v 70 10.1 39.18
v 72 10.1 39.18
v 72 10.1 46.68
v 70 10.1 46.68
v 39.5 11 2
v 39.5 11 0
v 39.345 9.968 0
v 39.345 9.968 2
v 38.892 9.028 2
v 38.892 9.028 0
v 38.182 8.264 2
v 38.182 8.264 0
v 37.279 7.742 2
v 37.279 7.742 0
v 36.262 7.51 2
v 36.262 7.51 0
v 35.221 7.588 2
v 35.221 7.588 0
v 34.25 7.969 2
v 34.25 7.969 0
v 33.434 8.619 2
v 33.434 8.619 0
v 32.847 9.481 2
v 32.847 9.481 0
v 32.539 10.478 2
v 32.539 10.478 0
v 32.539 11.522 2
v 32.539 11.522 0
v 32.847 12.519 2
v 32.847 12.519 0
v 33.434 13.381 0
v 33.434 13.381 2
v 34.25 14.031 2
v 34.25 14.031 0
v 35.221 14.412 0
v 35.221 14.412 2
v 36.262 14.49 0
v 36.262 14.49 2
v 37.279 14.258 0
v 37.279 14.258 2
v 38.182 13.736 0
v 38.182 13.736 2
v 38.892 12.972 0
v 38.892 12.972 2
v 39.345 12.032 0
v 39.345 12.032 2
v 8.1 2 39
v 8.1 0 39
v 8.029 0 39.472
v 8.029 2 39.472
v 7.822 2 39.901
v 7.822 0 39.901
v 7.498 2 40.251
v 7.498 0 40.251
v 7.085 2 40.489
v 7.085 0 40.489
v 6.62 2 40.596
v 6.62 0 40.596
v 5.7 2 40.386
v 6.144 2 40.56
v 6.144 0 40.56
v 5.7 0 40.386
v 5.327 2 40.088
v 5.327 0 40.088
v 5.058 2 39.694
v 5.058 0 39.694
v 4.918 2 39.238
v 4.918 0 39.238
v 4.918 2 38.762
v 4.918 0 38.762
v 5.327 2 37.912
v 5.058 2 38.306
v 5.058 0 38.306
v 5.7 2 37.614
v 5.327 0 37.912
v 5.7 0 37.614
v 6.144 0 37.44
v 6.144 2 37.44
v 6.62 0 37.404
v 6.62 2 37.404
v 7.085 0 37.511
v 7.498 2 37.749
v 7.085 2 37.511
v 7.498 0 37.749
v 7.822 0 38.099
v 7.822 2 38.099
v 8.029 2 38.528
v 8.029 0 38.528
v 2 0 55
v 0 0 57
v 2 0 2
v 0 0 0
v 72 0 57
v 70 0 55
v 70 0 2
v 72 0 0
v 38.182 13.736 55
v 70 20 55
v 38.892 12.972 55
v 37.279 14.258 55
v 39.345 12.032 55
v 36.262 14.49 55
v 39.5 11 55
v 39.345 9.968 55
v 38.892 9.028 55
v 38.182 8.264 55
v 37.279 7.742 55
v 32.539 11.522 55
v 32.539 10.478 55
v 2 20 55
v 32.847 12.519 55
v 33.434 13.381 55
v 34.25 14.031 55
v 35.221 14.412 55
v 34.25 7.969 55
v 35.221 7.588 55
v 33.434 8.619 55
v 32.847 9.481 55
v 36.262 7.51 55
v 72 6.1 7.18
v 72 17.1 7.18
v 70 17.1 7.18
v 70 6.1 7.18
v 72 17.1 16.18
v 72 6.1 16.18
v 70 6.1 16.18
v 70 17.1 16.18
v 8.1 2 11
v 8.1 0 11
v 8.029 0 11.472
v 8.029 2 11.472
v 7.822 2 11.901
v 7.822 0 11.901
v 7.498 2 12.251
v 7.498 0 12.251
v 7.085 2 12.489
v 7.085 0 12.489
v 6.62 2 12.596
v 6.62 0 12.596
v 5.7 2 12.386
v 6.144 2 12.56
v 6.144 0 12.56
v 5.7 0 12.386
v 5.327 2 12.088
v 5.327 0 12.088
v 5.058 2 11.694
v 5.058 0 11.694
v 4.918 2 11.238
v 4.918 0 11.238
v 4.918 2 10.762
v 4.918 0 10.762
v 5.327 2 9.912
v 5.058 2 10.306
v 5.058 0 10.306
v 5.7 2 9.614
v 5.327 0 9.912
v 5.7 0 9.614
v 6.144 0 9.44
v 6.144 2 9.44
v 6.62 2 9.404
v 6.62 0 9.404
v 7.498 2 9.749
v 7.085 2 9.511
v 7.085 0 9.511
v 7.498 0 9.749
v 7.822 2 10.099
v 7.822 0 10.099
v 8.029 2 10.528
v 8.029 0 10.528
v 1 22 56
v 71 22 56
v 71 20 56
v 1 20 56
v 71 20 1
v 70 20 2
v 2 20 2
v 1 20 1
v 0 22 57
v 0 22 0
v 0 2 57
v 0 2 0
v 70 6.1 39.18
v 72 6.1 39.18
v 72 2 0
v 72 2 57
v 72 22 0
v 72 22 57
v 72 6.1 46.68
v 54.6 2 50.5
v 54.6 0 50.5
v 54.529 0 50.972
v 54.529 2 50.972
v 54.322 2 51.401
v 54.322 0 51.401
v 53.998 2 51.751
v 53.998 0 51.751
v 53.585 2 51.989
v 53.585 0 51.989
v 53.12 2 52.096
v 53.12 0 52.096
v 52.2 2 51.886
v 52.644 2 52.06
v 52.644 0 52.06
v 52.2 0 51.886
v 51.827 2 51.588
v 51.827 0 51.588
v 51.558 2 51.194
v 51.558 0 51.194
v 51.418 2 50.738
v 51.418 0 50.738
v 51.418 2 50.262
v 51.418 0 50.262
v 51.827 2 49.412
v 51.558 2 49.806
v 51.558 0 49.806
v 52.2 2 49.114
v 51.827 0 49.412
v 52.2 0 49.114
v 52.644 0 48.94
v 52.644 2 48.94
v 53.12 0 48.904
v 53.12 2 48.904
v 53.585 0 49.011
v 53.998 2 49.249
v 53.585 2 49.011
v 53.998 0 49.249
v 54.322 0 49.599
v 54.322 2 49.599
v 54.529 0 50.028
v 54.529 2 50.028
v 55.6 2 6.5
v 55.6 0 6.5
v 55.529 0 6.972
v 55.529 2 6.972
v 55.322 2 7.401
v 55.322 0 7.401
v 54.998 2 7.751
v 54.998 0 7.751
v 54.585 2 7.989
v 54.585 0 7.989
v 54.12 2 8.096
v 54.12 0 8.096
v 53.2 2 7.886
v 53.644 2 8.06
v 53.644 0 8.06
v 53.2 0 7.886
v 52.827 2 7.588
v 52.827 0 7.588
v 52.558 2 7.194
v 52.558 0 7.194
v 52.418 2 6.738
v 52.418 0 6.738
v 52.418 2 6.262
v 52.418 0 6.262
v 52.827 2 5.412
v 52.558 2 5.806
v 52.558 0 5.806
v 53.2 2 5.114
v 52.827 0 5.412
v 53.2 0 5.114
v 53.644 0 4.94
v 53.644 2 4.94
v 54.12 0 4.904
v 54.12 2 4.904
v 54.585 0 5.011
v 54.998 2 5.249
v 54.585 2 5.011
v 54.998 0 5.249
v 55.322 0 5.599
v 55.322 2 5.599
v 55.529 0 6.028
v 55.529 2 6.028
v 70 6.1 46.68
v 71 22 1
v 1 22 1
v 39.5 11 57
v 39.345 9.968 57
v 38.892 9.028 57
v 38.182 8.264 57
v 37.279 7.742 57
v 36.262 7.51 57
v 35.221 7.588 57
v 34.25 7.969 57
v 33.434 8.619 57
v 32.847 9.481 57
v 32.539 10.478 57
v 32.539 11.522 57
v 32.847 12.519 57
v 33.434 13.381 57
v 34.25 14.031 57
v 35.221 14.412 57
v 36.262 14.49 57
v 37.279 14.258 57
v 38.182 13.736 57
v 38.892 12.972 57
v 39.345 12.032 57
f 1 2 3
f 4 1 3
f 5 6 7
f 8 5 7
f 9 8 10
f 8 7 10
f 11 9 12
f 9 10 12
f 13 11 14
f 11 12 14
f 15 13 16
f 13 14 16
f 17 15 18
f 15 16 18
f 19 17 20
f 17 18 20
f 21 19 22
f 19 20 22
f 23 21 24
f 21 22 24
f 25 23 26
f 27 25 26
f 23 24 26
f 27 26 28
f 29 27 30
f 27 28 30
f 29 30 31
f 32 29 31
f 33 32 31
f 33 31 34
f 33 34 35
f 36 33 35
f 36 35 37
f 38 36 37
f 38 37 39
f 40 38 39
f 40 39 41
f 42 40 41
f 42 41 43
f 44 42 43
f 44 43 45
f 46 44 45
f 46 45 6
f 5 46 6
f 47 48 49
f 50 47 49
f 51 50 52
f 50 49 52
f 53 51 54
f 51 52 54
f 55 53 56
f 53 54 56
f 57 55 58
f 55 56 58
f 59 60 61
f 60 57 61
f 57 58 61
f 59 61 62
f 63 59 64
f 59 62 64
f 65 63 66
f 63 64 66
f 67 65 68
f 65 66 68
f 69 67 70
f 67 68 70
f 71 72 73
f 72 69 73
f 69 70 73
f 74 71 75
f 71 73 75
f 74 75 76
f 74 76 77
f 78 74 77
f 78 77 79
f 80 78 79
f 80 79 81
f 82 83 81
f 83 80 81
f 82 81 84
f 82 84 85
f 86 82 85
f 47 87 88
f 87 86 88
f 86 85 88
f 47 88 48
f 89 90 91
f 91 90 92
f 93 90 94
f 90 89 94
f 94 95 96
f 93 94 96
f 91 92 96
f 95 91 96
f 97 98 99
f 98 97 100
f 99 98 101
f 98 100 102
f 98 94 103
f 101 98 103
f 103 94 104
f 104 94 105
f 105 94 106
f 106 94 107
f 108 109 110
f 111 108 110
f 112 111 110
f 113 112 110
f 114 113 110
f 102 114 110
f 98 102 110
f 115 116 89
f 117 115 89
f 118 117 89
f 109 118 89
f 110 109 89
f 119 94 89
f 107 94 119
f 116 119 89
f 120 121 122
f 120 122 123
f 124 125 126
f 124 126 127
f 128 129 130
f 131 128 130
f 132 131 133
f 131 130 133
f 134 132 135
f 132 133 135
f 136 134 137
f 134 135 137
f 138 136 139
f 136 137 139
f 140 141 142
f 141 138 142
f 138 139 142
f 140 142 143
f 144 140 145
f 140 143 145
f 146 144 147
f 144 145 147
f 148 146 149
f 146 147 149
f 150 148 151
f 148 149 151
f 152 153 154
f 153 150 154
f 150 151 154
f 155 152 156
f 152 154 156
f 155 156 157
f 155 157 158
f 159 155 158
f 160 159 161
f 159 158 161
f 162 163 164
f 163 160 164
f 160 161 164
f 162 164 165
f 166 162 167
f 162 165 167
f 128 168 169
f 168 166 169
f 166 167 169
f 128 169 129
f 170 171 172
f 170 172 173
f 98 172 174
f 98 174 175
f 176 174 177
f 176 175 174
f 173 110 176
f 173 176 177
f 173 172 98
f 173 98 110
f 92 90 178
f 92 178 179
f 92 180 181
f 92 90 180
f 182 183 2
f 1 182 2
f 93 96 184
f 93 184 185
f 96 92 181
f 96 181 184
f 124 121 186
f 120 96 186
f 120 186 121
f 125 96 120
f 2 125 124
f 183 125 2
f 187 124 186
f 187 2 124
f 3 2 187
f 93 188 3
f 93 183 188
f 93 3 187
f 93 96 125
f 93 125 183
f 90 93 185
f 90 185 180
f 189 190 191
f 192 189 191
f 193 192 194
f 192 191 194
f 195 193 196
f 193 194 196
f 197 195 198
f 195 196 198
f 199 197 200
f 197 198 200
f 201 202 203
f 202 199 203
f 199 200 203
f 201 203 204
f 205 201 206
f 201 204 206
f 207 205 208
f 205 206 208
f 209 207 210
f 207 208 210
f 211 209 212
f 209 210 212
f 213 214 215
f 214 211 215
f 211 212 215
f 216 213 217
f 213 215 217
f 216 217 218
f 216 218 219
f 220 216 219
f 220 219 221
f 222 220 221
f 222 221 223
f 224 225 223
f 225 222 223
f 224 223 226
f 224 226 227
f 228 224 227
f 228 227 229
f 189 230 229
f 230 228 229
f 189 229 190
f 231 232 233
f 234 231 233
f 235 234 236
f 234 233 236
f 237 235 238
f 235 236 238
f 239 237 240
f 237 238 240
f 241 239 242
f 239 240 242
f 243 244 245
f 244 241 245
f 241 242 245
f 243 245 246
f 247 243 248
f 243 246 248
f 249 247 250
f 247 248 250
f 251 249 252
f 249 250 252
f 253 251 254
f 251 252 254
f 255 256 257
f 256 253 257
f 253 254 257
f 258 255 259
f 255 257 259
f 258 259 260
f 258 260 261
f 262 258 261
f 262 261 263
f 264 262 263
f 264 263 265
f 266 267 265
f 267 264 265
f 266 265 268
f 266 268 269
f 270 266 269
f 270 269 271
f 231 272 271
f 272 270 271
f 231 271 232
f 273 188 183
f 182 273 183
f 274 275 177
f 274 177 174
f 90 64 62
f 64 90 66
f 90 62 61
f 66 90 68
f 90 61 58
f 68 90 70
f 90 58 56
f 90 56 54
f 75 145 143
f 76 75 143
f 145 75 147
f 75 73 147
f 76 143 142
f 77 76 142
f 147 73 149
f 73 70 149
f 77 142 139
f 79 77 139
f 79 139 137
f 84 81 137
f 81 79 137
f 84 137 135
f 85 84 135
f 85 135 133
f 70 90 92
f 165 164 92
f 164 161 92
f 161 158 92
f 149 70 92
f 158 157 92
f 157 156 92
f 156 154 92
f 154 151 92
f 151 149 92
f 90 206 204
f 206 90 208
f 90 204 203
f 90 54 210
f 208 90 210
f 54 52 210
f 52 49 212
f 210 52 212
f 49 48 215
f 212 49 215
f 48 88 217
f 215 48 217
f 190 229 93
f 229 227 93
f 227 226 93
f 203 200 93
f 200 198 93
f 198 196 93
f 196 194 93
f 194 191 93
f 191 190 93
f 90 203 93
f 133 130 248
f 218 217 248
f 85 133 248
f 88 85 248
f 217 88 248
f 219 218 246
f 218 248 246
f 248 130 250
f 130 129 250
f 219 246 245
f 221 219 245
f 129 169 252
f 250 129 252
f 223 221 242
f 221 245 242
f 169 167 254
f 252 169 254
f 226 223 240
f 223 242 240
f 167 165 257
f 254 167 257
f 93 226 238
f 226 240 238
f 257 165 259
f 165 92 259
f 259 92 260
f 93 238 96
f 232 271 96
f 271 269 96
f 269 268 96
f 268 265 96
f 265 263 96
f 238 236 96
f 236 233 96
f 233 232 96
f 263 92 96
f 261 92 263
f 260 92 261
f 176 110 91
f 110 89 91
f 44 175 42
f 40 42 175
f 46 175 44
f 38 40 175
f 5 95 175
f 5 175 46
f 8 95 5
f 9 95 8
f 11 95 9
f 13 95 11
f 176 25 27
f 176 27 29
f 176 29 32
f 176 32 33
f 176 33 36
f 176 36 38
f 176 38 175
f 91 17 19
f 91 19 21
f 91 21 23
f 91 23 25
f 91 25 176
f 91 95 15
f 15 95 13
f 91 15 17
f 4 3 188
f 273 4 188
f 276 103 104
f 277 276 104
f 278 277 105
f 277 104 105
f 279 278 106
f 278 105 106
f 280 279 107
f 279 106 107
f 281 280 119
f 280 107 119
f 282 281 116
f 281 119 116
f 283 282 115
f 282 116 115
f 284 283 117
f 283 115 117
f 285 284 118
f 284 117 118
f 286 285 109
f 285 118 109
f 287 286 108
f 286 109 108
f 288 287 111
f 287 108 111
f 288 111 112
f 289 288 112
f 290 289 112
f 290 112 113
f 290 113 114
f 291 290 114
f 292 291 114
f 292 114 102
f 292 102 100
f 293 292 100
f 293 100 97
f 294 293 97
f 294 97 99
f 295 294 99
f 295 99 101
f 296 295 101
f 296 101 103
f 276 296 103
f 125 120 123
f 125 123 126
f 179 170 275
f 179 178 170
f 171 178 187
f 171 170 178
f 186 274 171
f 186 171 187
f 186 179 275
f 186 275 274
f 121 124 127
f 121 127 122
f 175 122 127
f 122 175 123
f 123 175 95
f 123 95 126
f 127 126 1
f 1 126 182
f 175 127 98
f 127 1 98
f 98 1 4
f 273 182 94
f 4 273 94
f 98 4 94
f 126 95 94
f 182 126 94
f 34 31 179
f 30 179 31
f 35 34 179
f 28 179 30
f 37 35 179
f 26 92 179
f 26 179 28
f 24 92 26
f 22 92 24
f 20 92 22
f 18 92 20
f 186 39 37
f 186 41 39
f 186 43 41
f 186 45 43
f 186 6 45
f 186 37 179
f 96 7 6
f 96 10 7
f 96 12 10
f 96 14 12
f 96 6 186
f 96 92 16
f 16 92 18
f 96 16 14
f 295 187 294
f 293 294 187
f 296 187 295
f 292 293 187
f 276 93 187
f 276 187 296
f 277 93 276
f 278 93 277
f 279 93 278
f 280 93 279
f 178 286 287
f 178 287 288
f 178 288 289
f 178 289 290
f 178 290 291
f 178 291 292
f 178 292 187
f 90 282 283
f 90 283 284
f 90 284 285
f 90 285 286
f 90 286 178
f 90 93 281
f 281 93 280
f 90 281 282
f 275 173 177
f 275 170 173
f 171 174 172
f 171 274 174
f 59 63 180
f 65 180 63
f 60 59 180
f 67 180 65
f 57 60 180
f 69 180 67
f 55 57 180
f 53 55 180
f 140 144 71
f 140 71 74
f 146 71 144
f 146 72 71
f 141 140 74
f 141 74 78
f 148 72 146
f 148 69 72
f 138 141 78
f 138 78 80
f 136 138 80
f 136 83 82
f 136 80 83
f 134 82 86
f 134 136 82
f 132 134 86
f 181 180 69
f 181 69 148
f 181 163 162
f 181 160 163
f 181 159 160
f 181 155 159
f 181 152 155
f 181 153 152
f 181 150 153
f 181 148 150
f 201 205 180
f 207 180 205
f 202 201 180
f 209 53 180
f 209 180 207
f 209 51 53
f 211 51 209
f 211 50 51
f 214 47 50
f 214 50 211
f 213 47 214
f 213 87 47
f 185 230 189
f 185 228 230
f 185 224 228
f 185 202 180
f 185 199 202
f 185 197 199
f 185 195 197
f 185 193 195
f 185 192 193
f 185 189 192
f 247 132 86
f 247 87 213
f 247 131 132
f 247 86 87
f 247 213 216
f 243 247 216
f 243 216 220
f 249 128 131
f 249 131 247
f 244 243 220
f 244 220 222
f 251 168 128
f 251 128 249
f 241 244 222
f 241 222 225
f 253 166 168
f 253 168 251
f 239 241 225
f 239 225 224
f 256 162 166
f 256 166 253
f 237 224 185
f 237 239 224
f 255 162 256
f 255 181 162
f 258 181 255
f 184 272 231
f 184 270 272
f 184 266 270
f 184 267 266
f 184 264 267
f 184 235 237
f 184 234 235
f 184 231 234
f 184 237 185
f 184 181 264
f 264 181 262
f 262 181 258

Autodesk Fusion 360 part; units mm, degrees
sketch "Esquisse1" plane through (0, 0, 0) normal (0, 1, 0) x (1, 0, 0)
  line L0 (0, 0) -> (72, 0)
  line L1 (72, 0) -> (72, -57)
  line L2 (72, -57) -> (0, -57)
  line L3 (0, -57) -> (0, 0)
  line L4 (72, -53) -> (0, -53) construction
  line L5 (72, -4) -> (0, -4) construction
  line L6 (68, -57) -> (68, 0) construction
  line L7 (4, -57) -> (4, 0) construction
  line L8 (68, -50.5) -> (53, -50.5) construction
  circle A0 centre (53, -50.5) radius 1.6
  line L9 (6.5, -4) -> (6.5, -11) construction
  circle A1 centre (6.5, -11) radius 1.6
  line L10 (6.5, -11) -> (6.5, -39) construction
  circle A2 centre (6.5, -39) radius 1.6
  line L11 (68, -6.5) -> (54, -6.5) construction
  circle A3 centre (54, -6.5) radius 1.6
  line L12 (70, -2) -> (70, -55)
  line L13 (70, -55) -> (2, -55)
  line L14 (2, -55) -> (2, -2)
  line L15 (70, -2) -> (2, -2)
  dimension "d1" = 57
  dimension "d2" = 72
  dimension "d3" = 4
  dimension "d4" = 4
  dimension "d5" = 4
  dimension "d6" = 4
  dimension "d7" = 2.5
  dimension "d8" = 15
  dimension "d9" = 3.2
  dimension "d10" = 2.5
  dimension "d11" = 7
  dimension "d12" = 3.2
  dimension "d13" = 35
  dimension "d14" = 3.2
  dimension "d19" = 14
  dimension "d20" = 2.5
  dimension "d21" = 3.2
  dimension "d24" = 2
  dimension "d25" = 2
  dimension "d26" = 2
  dimension "d27" = 2
extrude "Extrusion1" add sketch "Esquisse1" along normal blind 2 contours L0 L1 L2 L3 | L12 L13 L14 L15 makes body 1
copy_body "Corps->Comp1" bodies 1 removing the originals makes body 2 in component "boiteArduino"
extrude "Extrusion1'" add sketch "Esquisse1" along normal blind 22 separate body contours L0 L1 L2 L3 makes body 3 in component "boiteArduino"
sketch "Esquisse1 (2)" plane through (72, 0, 0) normal (1, 0, 0) x (0, 1, 0) in component "boiteArduino"
  line L0 (0, 57) -> (0, 0)
  line L1 (0, 0) -> (22, 0)
  line L2 (22, 0) -> (22, 57)
  line L3 (22, 57) -> (0, 57)
  line L4 (6.1, 4) -> (9.3822, 4) construction
  line L5 (6.1, 4) -> (6.1, 7.18) construction
  line L6 (0, 0) -> (0, 57) construction
  line L7 (6.1, 7.18) -> (6.1, 16.18)
  line L8 (6.1, 16.18) -> (17.1, 16.18)
  line L9 (17.1, 16.18) -> (17.1, 7.18)
  line L10 (17.1, 7.18) -> (6.1, 7.18)
  dimension "d34" = 4
  dimension "d35" = 3.18
  dimension "d36" = 6.1
  dimension "d41" = 9
  dimension "d42" = 11
extrude "Extrusion2" cut sketch "Esquisse1 (2)" against normal blind 9 contours L7 L8 L9 L10 bodies 3 in component "boiteArduino"
sketch "Esquisse2" plane through (72, 0, 0) normal (1, 0, 0) x (0, 1, 0) in component "boiteArduino"
  line L0 (6.1, 16.18) -> (17.1, 16.18)
  line L1 (17.1, 16.18) -> (17.1, 7.18)
  line L2 (17.1, 7.18) -> (6.1, 7.18)
  line L3 (6.1, 7.18) -> (6.1, 16.18)
  line L4 (0, 57) -> (0, 0)
  line L5 (0, 0) -> (22, 0)
  line L6 (22, 0) -> (22, 57)
  line L7 (22, 57) -> (0, 57)
  line L8 (6.1, 16.18) -> (6.1, 39.18) construction
  line L9 (6.1, 39.18) -> (10.1, 39.18)
  line L10 (10.1, 39.18) -> (10.1, 46.68)
  line L11 (10.1, 46.68) -> (6.1, 46.68)
  line L12 (6.1, 46.68) -> (6.1, 39.18)
  dimension "d45" = 23
  dimension "d49" = 7.5
  dimension "d50" = 4
extrude "Extrusion3" cut sketch "Esquisse2" against normal blind 7 contours L9 L10 L11 L12 bodies 3 in component "boiteArduino"
sketch "Esquisse3" plane through (0, 0, 0) normal (0, 0, -1) x (1, 0, 0) in component "boiteArduino"
  line L0 (72, 0) -> (0, 0)
  line L1 (0, 0) -> (0, -22)
  line L2 (0, -22) -> (72, -22)
  line L3 (72, -22) -> (72, 0)
  line L4 (0, -11) -> (72, -11) construction
  line L5 (36, -22) -> (36, 0) construction
  circle A0 centre (36, -11) radius 3.5
  dimension "d53" = 11
  dimension "d54" = 36
  dimension "d55" = 7
extrude "Extrusion4" cut sketch "Esquisse3" against normal blind 65 contours A0 bodies 3 in component "boiteArduino"
sketch "Esquisse4" plane through (0, 22, 0) normal (0, 1, 0) x (-1, 0, 0) in component "boiteArduino"
  line L0 (-70, 2) -> (-70, 55)
  line L1 (-70, 55) -> (-2, 55)
  line L2 (-2, 55) -> (-2, 2)
  line L3 (-2, 2) -> (-70, 2)
  line L4 (0, 57) -> (-72, 57)
  line L5 (-72, 57) -> (-72, 0)
  line L6 (-72, 0) -> (0, 0)
  line L7 (0, 0) -> (0, 57)
  line L8 (-71, 56) -> (-1, 56)
  line L9 (-1, 56) -> (-1, 1)
  line L10 (-1, 1) -> (-71, 1)
  line L11 (-71, 1) -> (-71, 56)
  line L12 (-72, 57) -> (0, 57)
  dimension "d64" = 1
  dimension "d65" = 1
extrude "Extrusion5" cut sketch "Esquisse4" against normal blind 2 contours L8 L9 L10 L11 bodies 3 in component "boiteArduino"
component "boiteArduino" placed x (1, 0, 0) y (0, 1, 0) z (0, 0, 1) at (0, 0, 0)
equation "d1 = hauteurMAXoff"
equation "d2 = largeurMAXoff"
equation "d3 = offset"
equation "d4 = offset"
equation "d5 = offset"
equation "d6 = offset"
equation "d7 = distanceCoteCarteTrouVisse"
equation "d8 = distanceTrouVise1"
equation "d9 = rayonCercle"
equation "d10 = distanceCoteCarteTrouVisse"
equation "d11 = distanceTrouVise3"
equation "d12 = rayonCercle"
equation "d13 = distanceTrouVise4"
equation "d14 = rayonCercle"
equation "rayonCercle = 3.2 mm"
equation "offset = 4 mm"
equation "largeurMAXoff = 72 mm"
equation "hauteurMAXoff = 57 mm"
equation "d19 = distanceTrouVise2"
equation "d20 = distanceCoteCarteTrouVisse"
equation "d21 = rayonCercle"
equation "d22 = hauteurbase"
equation "d24 = offset / 2"
equation "d25 = offset / 2"
equation "d26 = offset / 2"
equation "d27 = offset / 2"
equation "hauteurBoite = 20 mm"
equation "hauteurbase = 2 mm"
equation "d32 = hauteurBoite + hauteurbase"
equation "d34 = offset"
equation "d36 = hauteurbase + hauteurSoudure + hauteurCarte"
equation "hauteurCarte = 1.65 mm"
equation "hauteurSoudure = 2.45 mm"
equation "largeurAlimentation = 9 mm"
equation "hauteurAlimentation = 11 mm"
equation "d41 = largeurAlimentation"
equation "d42 = hauteurAlimentation"
equation "d45 = largeurUSBalimentation"
equation "largeurUSBalimentation = 23 mm"
equation "largeurUSB = 7.5 mm"
equation "hauteurUSB = 4 mm"
equation "d49 = largeurUSB"
equation "d50 = hauteurUSB"
equation "d53 = ( hauteurbase + hauteurBoite ) / 2"
equation "d54 = largeurMAXoff / 2"
equation "d55 = cercleCable"
equation "cercleCable = 7 mm"
equation "distanceCoteCarteTrouVisse = 2.5 mm"
equation "distanceTrouVise1 = 15 mm"
equation "distanceTrouVise2 = 14 mm"
equation "distanceTrouVise3 = 7 mm"
equation "distanceTrouVise4 = 35 mm"
equation "d64 = offset / 2 / 2"
equation "d65 = offset / 2 / 2"
equation "hauteurPlexi = 2 mm"
equation "d67 = -hauteurPlexi"
